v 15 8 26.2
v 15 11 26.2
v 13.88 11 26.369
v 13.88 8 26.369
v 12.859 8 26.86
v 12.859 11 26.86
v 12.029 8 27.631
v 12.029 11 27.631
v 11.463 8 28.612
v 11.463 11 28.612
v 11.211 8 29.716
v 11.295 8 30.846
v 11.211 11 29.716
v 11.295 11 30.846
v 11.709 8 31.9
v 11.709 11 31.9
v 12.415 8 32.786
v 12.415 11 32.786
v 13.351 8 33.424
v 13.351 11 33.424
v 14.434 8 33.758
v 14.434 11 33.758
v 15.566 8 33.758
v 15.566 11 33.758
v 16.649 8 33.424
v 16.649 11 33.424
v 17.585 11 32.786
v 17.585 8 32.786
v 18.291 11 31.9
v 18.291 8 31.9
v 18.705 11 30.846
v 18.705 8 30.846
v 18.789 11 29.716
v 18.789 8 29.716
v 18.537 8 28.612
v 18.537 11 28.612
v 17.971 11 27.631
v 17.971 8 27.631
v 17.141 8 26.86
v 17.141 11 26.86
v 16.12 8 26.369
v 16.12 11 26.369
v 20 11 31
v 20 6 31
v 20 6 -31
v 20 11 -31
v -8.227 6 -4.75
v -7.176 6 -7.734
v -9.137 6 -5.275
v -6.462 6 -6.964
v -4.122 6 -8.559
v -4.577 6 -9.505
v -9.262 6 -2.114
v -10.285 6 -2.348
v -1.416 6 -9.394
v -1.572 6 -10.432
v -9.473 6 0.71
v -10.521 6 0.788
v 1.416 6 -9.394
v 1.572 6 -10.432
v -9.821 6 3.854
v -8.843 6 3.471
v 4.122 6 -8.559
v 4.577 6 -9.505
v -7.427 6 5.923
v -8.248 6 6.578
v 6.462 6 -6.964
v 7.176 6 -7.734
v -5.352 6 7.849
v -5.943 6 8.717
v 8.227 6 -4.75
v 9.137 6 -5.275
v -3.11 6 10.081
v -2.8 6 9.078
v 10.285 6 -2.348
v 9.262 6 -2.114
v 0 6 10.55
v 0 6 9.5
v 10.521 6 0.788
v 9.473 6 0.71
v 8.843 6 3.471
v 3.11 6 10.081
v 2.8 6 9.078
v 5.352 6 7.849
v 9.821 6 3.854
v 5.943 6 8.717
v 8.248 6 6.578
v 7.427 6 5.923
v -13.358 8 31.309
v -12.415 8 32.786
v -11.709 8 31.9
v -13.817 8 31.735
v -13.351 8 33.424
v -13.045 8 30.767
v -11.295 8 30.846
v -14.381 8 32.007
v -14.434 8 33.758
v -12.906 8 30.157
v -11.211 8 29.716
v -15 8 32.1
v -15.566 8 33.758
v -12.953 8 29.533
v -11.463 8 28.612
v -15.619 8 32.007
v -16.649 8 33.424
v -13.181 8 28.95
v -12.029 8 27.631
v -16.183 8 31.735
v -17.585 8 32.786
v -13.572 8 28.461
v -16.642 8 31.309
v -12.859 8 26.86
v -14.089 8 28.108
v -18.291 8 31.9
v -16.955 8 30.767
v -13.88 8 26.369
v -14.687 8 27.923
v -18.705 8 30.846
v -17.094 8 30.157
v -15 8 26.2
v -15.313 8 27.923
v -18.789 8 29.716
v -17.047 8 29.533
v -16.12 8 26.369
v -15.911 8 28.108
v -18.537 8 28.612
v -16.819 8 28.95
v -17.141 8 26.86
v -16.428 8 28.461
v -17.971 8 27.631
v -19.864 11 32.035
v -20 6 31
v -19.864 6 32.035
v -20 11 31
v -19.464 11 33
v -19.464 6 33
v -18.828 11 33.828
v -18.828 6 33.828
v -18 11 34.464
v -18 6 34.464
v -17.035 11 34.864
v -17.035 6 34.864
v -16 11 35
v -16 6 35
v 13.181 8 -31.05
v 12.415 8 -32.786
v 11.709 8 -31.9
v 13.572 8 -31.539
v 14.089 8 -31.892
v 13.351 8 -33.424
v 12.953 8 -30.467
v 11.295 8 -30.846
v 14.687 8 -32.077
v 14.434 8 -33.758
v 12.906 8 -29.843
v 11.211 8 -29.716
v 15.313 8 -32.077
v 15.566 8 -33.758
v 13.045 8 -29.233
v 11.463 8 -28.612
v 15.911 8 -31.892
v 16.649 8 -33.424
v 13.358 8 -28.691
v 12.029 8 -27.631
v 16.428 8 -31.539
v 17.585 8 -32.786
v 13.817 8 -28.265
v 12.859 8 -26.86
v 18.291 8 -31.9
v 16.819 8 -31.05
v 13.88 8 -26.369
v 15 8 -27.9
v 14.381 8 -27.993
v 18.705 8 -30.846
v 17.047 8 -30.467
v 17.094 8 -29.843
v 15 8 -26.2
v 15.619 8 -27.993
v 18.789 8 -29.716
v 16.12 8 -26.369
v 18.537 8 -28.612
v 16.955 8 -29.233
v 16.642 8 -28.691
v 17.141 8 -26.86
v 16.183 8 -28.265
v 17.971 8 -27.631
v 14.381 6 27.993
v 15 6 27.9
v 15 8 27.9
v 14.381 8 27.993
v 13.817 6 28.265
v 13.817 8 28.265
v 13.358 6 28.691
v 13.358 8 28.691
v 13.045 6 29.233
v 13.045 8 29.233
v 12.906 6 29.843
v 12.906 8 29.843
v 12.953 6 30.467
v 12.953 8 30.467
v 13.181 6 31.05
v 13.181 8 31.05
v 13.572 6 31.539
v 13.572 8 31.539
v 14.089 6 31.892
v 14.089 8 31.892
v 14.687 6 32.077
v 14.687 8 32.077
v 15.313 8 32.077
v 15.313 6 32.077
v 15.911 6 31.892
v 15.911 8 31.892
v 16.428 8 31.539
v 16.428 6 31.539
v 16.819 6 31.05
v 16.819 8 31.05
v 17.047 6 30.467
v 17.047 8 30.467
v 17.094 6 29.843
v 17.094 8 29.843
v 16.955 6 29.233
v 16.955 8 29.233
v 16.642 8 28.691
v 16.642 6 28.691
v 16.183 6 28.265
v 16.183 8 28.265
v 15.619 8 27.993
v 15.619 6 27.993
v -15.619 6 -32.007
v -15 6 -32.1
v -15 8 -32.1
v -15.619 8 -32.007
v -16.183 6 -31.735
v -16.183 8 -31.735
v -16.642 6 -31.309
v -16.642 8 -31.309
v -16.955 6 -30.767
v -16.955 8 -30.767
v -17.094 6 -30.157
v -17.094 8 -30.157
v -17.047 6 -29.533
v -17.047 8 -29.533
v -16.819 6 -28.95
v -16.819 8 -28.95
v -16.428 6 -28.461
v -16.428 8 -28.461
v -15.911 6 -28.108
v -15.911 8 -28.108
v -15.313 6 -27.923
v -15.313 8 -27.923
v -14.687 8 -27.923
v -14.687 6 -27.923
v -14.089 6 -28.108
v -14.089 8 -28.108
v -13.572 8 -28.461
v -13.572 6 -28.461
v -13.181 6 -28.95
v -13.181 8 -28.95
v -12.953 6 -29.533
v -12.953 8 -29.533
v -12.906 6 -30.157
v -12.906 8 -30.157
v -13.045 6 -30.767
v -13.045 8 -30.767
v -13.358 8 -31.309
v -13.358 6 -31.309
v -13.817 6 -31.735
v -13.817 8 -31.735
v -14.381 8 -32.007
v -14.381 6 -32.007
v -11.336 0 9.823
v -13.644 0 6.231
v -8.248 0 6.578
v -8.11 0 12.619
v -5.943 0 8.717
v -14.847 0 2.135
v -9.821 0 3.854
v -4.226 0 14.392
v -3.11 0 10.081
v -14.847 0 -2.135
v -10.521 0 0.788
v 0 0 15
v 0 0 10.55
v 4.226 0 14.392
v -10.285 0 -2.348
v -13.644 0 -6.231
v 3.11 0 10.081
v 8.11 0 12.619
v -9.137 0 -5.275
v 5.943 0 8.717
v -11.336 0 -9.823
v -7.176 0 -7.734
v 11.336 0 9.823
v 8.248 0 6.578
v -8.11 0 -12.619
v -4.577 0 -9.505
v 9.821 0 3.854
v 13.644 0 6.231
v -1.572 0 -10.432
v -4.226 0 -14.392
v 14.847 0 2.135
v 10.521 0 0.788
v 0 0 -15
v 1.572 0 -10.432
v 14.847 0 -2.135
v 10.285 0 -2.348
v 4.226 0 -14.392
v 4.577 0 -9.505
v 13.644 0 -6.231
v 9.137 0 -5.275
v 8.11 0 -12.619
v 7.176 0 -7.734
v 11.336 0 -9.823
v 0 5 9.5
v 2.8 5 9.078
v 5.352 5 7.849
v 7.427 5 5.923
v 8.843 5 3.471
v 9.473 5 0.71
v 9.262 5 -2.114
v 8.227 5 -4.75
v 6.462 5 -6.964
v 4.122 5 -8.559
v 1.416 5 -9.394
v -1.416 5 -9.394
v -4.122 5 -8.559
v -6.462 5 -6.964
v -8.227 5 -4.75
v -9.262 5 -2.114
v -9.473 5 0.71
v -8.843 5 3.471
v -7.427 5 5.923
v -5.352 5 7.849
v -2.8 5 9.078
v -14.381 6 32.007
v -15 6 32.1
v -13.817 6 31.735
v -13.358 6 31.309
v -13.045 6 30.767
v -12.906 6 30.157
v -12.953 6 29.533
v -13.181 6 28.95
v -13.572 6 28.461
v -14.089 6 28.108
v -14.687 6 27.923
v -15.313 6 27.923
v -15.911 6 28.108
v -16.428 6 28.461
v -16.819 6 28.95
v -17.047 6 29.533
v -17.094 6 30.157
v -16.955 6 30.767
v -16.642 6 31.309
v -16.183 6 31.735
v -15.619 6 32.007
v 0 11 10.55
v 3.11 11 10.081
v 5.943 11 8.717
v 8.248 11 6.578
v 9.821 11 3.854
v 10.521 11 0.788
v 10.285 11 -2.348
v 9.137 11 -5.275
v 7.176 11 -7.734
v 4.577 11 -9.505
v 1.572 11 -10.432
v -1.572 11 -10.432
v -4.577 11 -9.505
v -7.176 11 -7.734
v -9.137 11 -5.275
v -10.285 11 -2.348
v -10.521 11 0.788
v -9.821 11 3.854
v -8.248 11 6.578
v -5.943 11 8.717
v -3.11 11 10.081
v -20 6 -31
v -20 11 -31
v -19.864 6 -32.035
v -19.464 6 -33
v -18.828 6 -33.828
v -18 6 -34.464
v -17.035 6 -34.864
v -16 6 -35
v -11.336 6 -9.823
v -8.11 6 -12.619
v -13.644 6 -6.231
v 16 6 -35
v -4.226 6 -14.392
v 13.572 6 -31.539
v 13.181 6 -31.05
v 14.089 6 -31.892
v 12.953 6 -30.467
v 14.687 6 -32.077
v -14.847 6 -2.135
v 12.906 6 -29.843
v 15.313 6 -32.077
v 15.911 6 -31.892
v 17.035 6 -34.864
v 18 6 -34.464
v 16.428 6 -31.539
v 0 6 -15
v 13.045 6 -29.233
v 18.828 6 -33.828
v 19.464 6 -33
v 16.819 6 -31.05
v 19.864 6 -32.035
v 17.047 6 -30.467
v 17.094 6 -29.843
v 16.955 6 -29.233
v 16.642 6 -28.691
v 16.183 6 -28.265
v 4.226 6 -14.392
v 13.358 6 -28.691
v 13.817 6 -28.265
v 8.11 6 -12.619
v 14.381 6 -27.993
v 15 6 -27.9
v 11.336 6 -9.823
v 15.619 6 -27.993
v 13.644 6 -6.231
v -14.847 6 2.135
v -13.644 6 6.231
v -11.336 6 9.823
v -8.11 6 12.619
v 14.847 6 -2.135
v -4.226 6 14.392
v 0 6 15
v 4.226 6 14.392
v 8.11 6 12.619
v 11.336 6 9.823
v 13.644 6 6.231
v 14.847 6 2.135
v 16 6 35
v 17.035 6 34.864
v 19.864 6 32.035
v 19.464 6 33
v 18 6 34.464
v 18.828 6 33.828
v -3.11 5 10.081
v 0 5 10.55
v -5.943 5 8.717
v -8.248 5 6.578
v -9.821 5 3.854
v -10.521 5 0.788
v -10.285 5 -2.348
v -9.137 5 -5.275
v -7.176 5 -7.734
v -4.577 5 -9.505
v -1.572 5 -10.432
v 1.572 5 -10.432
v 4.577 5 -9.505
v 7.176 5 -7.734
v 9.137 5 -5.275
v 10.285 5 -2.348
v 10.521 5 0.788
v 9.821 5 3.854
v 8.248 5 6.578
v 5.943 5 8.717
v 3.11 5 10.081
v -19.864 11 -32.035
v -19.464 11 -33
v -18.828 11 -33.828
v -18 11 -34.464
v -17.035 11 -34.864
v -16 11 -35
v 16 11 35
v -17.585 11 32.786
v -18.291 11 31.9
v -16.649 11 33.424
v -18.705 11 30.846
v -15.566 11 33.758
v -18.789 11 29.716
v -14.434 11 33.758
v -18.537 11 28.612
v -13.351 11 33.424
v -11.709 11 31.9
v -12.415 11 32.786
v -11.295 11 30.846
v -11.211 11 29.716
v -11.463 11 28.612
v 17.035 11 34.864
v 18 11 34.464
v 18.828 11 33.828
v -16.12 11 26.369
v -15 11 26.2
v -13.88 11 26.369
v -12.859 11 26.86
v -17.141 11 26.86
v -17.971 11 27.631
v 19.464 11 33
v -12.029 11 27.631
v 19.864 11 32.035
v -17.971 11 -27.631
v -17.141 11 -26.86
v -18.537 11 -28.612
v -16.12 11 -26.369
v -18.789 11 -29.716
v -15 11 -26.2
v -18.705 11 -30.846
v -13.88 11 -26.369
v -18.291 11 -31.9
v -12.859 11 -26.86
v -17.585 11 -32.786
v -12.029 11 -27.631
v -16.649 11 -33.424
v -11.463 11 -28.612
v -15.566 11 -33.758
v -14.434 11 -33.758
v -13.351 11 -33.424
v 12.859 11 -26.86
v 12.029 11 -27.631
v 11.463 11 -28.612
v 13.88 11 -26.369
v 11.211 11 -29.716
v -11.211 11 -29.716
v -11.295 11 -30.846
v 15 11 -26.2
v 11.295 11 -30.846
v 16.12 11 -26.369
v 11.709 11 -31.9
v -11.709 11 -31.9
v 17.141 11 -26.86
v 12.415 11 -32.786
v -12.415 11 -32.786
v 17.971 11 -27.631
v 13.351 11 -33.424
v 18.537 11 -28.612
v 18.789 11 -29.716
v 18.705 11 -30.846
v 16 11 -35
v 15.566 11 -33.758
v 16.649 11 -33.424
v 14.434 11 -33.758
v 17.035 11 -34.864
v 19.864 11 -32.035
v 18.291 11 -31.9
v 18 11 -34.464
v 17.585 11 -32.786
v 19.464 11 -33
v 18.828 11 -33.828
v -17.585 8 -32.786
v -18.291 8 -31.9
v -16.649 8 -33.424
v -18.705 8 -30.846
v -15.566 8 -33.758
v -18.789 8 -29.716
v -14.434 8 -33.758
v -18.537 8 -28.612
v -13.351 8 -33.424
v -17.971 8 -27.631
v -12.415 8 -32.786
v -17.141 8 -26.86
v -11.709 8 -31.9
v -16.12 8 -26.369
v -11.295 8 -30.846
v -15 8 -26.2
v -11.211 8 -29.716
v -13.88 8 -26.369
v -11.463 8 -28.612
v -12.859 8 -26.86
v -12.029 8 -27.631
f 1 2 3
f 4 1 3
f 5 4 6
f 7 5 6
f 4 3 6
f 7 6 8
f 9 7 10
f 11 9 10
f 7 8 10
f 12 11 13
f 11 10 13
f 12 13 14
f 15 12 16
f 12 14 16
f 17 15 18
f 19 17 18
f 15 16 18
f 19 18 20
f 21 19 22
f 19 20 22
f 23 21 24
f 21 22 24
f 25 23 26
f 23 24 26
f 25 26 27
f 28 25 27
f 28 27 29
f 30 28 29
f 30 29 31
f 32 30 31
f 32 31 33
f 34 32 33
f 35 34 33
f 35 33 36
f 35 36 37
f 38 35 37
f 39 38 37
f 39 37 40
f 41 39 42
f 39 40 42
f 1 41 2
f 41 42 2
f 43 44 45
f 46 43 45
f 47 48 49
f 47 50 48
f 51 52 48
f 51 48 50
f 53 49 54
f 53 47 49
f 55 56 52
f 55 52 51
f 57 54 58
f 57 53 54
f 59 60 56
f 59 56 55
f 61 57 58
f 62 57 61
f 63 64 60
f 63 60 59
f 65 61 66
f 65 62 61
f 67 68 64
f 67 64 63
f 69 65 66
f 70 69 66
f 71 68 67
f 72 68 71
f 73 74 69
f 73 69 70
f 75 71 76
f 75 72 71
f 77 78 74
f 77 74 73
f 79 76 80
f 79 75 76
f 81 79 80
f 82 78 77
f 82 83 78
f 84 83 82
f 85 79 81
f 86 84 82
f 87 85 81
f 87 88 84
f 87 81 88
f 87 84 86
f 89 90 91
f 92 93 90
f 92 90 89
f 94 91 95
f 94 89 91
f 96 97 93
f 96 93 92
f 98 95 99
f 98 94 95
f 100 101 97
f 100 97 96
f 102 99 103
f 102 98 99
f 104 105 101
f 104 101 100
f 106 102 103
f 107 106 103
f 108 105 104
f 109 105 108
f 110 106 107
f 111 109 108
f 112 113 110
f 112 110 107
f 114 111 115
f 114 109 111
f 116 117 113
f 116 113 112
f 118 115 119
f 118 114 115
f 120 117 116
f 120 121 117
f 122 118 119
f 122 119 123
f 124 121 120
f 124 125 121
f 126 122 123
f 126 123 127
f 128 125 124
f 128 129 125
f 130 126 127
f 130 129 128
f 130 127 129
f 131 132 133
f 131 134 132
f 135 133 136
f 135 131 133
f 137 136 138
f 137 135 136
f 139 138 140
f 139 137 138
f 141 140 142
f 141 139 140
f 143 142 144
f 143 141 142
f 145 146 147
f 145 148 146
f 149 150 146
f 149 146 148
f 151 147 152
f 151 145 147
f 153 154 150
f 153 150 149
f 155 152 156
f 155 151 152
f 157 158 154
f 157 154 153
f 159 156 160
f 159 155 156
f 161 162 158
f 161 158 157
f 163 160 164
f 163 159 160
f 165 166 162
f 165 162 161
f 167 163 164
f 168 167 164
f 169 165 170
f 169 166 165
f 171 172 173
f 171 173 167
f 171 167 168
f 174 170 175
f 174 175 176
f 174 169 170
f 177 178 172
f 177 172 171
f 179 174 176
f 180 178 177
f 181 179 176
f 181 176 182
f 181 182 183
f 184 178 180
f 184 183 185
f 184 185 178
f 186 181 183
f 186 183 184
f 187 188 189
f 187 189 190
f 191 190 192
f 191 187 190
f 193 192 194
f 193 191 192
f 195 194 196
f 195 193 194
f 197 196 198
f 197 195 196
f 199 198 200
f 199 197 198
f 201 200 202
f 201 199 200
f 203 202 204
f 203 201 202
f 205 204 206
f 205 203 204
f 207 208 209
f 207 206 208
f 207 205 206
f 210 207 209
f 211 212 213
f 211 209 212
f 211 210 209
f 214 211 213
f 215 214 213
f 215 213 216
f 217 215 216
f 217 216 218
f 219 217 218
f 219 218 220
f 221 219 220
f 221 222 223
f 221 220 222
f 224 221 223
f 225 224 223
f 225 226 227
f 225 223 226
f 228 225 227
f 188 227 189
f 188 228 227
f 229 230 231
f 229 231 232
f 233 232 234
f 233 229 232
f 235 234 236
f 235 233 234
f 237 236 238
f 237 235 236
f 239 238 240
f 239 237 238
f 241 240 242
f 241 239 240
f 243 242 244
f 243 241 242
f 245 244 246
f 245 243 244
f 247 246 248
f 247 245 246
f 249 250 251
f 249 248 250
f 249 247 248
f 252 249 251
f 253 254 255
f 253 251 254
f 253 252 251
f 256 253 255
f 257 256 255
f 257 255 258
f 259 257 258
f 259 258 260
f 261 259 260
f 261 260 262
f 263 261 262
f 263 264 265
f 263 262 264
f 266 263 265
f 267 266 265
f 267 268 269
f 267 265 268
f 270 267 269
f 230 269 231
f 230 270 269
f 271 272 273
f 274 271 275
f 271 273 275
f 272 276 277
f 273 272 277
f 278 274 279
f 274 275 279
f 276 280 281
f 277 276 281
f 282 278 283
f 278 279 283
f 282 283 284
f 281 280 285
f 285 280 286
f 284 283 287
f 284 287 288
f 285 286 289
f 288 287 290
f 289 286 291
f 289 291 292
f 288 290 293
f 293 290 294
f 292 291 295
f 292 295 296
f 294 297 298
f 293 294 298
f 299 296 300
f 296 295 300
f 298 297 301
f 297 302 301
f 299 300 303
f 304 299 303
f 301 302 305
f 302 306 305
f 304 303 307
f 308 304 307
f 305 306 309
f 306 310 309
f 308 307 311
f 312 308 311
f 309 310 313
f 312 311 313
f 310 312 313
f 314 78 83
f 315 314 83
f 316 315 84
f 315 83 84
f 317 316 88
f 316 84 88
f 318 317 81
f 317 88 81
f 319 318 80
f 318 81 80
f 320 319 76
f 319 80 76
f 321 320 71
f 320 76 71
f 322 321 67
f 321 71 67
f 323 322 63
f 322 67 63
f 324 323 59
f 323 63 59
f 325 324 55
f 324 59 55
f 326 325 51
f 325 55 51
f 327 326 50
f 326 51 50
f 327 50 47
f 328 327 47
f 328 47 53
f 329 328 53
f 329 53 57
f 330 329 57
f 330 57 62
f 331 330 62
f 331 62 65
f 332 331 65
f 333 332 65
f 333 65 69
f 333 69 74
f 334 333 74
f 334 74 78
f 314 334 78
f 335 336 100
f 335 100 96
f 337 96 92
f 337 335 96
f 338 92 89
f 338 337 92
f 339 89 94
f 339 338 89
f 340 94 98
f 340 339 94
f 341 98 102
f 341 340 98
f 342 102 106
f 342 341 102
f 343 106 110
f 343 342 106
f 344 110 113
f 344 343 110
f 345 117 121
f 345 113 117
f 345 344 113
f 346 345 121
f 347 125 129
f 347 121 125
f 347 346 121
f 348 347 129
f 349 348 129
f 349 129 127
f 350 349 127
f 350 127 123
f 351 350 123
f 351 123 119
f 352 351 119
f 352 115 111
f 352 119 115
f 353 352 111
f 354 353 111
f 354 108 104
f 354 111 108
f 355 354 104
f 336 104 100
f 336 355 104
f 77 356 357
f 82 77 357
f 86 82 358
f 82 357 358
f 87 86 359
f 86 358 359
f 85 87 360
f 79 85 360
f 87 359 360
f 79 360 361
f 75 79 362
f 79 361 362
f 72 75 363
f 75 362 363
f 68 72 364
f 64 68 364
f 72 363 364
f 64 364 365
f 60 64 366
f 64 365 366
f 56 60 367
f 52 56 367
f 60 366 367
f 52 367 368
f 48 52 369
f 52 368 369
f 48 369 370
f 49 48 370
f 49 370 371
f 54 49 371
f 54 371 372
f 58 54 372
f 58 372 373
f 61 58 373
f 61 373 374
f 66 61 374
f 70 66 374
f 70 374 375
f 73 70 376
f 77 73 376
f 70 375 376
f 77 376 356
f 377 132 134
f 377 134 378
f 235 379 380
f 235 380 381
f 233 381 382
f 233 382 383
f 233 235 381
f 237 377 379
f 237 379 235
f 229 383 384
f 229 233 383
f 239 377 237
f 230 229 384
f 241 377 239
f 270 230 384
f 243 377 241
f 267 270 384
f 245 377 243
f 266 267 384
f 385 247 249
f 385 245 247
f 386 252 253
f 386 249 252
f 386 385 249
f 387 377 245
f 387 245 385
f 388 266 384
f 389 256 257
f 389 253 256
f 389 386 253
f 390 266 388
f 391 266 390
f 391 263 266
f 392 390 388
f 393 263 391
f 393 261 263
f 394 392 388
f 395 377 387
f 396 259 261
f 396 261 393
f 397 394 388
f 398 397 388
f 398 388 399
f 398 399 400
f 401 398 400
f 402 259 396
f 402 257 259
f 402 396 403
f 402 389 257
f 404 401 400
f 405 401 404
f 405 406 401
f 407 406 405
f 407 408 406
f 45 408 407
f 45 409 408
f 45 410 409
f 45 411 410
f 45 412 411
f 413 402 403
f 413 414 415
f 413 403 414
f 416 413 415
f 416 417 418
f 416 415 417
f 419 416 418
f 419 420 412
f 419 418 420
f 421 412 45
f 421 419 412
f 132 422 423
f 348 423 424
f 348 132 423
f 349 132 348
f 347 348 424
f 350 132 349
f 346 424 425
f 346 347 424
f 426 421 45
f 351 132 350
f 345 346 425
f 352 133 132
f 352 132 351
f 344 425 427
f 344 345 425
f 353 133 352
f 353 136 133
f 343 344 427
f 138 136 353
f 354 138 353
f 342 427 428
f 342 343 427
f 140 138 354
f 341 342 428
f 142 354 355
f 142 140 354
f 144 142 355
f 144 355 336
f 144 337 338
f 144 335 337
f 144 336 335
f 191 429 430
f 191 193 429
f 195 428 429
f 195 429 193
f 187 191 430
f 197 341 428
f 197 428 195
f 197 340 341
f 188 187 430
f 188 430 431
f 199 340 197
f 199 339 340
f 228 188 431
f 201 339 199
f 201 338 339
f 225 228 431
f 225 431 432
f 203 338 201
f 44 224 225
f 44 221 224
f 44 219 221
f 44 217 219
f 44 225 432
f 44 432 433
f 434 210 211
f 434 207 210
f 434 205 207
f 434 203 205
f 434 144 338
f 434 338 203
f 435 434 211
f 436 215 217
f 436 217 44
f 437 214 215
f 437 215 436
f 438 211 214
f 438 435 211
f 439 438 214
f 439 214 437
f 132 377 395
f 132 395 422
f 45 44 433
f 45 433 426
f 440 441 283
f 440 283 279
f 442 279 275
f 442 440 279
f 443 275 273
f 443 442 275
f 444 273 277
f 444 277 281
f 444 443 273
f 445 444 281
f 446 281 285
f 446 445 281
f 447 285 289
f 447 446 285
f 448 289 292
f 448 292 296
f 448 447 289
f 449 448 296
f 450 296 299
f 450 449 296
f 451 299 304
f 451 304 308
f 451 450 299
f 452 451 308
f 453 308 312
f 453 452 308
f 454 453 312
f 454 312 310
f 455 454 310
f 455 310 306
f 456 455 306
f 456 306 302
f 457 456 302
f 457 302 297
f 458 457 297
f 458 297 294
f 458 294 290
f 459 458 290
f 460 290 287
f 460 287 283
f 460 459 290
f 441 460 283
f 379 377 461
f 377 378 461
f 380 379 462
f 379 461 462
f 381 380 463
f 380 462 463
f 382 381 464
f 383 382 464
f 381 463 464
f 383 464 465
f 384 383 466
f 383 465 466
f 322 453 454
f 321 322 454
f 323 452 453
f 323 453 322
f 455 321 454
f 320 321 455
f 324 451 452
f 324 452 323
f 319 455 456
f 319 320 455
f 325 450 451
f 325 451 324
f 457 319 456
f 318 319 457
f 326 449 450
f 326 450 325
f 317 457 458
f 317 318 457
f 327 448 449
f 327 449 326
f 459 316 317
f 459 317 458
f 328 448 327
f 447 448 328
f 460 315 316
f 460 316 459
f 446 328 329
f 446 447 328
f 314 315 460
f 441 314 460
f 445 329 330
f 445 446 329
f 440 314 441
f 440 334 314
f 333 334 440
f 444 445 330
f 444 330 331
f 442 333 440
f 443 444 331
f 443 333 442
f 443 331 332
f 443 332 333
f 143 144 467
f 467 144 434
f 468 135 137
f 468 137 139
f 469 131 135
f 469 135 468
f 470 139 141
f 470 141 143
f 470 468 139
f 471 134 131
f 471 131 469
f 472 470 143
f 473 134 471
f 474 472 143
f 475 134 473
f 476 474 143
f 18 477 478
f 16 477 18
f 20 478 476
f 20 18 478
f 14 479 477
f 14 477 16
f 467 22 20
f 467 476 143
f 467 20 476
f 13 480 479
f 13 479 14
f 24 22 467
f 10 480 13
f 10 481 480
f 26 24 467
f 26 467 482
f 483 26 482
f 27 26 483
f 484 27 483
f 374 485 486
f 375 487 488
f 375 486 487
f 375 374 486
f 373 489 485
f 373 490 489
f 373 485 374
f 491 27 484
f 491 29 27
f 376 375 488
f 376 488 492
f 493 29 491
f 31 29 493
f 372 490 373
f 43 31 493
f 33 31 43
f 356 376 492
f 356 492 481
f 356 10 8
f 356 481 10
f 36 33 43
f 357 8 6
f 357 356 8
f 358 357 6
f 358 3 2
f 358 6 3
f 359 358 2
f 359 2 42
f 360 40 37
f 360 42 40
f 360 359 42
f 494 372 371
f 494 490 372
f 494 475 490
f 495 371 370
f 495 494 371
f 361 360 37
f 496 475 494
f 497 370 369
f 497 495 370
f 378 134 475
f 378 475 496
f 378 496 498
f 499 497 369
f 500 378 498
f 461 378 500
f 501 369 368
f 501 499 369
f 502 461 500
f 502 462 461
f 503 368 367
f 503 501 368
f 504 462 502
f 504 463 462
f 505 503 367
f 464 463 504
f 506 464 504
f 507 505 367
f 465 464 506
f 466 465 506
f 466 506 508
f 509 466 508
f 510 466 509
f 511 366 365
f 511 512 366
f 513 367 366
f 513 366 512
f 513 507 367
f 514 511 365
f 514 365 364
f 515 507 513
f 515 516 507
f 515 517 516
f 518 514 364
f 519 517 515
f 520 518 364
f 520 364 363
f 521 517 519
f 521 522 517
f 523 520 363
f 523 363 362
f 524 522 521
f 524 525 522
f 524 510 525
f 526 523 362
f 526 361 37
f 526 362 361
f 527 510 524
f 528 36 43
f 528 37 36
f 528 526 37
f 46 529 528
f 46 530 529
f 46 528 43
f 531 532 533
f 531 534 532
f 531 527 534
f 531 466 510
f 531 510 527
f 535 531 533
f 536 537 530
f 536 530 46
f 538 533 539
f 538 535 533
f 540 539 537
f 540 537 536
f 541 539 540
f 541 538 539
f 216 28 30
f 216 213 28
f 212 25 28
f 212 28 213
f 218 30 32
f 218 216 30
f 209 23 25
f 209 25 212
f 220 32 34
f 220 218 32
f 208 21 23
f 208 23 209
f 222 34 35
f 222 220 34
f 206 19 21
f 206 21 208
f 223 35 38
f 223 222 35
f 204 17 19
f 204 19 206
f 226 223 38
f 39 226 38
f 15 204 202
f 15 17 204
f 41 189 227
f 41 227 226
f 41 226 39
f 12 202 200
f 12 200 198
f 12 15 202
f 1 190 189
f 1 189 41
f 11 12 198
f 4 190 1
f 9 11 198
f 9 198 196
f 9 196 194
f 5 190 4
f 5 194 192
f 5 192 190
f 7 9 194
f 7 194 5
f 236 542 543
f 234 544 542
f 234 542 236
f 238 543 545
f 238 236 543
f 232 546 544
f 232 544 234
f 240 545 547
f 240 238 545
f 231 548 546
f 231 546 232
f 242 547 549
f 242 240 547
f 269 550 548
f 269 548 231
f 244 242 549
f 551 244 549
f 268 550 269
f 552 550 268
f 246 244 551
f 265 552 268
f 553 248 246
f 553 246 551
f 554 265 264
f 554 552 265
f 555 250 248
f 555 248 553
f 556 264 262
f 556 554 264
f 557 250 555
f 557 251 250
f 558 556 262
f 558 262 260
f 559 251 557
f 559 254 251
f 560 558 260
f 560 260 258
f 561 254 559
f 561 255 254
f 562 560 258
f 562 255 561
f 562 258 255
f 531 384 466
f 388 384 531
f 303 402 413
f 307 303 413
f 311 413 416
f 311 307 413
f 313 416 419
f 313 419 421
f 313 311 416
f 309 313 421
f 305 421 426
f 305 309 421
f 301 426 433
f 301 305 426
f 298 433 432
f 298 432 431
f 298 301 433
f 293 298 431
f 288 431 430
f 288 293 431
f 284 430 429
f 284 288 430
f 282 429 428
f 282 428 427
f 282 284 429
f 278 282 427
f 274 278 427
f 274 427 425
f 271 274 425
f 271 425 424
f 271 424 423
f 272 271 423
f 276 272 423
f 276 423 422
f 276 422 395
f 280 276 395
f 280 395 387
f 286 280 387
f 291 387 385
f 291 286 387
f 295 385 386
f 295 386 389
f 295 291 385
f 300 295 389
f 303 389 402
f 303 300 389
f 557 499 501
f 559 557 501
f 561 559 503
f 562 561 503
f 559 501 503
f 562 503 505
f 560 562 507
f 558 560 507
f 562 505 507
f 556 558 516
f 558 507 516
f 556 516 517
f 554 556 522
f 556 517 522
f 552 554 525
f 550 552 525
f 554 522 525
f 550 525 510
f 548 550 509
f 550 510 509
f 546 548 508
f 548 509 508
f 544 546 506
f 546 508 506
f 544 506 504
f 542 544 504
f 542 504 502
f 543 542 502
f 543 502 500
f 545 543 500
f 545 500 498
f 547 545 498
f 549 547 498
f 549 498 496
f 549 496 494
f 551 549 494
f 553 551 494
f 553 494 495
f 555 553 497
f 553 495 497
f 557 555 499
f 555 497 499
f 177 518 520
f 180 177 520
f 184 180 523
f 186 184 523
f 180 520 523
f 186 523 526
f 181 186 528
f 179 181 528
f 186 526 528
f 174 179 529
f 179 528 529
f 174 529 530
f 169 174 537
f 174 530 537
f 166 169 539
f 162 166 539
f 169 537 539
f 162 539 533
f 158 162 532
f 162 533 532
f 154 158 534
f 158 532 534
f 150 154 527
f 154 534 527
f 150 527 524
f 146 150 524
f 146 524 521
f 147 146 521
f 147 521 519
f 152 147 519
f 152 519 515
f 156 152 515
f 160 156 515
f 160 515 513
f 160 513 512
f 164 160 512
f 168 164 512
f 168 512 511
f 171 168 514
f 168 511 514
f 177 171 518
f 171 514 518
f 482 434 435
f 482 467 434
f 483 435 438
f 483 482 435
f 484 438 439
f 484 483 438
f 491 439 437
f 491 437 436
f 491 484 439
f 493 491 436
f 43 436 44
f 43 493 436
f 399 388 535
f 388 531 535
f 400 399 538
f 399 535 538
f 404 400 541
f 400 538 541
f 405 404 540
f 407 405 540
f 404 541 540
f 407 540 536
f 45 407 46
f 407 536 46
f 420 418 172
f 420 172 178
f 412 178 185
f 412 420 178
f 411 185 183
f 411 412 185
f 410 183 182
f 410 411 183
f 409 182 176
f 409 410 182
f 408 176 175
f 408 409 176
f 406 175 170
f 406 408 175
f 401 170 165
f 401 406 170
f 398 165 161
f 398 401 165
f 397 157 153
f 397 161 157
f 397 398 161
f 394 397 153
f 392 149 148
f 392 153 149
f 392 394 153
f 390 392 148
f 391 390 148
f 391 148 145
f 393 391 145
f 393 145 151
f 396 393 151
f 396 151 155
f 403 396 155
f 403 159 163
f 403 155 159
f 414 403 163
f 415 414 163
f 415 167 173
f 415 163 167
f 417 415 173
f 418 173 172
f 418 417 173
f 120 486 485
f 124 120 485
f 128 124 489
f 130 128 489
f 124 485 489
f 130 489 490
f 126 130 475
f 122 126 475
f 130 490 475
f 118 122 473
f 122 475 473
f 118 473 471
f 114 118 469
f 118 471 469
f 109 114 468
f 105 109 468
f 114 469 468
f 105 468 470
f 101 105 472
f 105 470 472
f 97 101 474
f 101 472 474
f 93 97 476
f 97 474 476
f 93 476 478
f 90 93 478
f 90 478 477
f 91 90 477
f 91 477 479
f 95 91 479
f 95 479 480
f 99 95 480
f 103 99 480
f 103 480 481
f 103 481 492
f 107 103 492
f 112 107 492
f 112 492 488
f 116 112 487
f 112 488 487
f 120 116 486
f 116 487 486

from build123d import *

# Parameters (mm, degrees)
SKETCH_1_W          = 40
SKETCH_1_H          = 70
SKETCH_1_R          = 2.1
EXTRUDE_1_DEPTH     = 11
SKETCH_2_R          = 9.5
CUT_EXTRUDE_1_DEPTH = 11
SKETCH_3_R          = 10.55
CUT_EXTRUDE_2_DEPTH = 5
CUT_EXTRUDE_START   = -5
SKETCH_4_R          = 10.55
CUT_EXTRUDE_3_DEPTH = 5
SKETCH_5_W          = 40
SKETCH_5_H          = 70
SKETCH_5_R          = 15
CUT_EXTRUDE_4_DEPTH = 6
SKETCH_6_R          = 3.8
CUT_EXTRUDE_5_DEPTH = 3
FILLET_1_R          = 4


with BuildPart() as part:
    # 草图1 → 凸台-拉伸1 (new body)
    with BuildSketch(Plane(origin=(0, 0, 0), x_dir=(1, 0, 0), z_dir=(0, 1, 0))):
        Rectangle(SKETCH_1_W, SKETCH_1_H)
        with Locations(Location((-15, -30, 0), (0, 0, 270))):
            Circle(SKETCH_1_R, mode=Mode.SUBTRACT)
        with Locations(Location((15, -30, 0), (0, 0, 90))):
            Circle(SKETCH_1_R, mode=Mode.SUBTRACT)
        with Locations(Location((15, 30, 0), (0, 0, 270))):
            Circle(SKETCH_1_R, mode=Mode.SUBTRACT)
        with Locations(Location((-15, 30, 0), (0, 0, 90))):
            Circle(SKETCH_1_R, mode=Mode.SUBTRACT)
    extrude(amount=EXTRUDE_1_DEPTH)

    # 草图2 → 切除-拉伸1 (cut)
    with BuildSketch(Plane(origin=(0, 11, 0), x_dir=(1, 0, 0), z_dir=(0, 1, 0))):
        with Locations(Location((0, 0, 0), (0, 0, 270))):
            Circle(SKETCH_2_R)
    extrude(amount=-CUT_EXTRUDE_1_DEPTH, mode=Mode.SUBTRACT)

    # 草图3 → 切除-拉伸2 (cut)
    with BuildSketch(Plane(origin=(0, 11, 0), x_dir=(1, 0, 0), z_dir=(0, 1, 0))):
        with Locations(Location((0, 0, 0), (0, 0, 270))):
            Circle(SKETCH_3_R)
    extrude(amount=-CUT_EXTRUDE_2_DEPTH, mode=Mode.SUBTRACT)

    # 草图4 → 切除-拉伸3 (cut)
    with BuildSketch(Plane.XZ.offset(CUT_EXTRUDE_START)):
        with Locations(Location((0, 0, 0), (0, 0, 90))):
            Circle(SKETCH_4_R)
    extrude(amount=CUT_EXTRUDE_3_DEPTH, mode=Mode.SUBTRACT)

    # 草图5 → 切除-拉伸4 (cut)
    with BuildSketch(Plane.XZ):
        Rectangle(SKETCH_5_W, SKETCH_5_H)
        with Locations(Location((0, 0, 0), (0, 0, 270))):
            Circle(SKETCH_5_R, mode=Mode.SUBTRACT)
    extrude(amount=-CUT_EXTRUDE_4_DEPTH, mode=Mode.SUBTRACT)

    # 草图6 → 切除-拉伸5 (cut)
    with BuildSketch(Plane(origin=(0, 11, 0), x_dir=(1, 0, 0), z_dir=(0, 1, 0))):
        with Locations(Location((-15, 30, 0), (0, 0, 270))):
            Circle(SKETCH_6_R)
        with Locations(Location((15, 30, 0), (0, 0, 270))):
            Circle(SKETCH_6_R)
        with Locations(Location((15, -30, 0), (0, 0, 90))):
            Circle(SKETCH_6_R)
        with Locations(Location((-15, -30, 0), (0, 0, 90))):
            Circle(SKETCH_6_R)
    extrude(amount=-CUT_EXTRUDE_5_DEPTH, mode=Mode.SUBTRACT)

    # 圆角1
    fillet_1_edges = [part.edges().sort_by_distance(p)[0] for p in [
        (20, 8.5, 35),
        (-20, 8.5, 35),
        (-20, 8.5, -35),
        (20, 8.5, -35),
    ]]
    fillet(fillet_1_edges, radius=FILLET_1_R)


solid = part.part
